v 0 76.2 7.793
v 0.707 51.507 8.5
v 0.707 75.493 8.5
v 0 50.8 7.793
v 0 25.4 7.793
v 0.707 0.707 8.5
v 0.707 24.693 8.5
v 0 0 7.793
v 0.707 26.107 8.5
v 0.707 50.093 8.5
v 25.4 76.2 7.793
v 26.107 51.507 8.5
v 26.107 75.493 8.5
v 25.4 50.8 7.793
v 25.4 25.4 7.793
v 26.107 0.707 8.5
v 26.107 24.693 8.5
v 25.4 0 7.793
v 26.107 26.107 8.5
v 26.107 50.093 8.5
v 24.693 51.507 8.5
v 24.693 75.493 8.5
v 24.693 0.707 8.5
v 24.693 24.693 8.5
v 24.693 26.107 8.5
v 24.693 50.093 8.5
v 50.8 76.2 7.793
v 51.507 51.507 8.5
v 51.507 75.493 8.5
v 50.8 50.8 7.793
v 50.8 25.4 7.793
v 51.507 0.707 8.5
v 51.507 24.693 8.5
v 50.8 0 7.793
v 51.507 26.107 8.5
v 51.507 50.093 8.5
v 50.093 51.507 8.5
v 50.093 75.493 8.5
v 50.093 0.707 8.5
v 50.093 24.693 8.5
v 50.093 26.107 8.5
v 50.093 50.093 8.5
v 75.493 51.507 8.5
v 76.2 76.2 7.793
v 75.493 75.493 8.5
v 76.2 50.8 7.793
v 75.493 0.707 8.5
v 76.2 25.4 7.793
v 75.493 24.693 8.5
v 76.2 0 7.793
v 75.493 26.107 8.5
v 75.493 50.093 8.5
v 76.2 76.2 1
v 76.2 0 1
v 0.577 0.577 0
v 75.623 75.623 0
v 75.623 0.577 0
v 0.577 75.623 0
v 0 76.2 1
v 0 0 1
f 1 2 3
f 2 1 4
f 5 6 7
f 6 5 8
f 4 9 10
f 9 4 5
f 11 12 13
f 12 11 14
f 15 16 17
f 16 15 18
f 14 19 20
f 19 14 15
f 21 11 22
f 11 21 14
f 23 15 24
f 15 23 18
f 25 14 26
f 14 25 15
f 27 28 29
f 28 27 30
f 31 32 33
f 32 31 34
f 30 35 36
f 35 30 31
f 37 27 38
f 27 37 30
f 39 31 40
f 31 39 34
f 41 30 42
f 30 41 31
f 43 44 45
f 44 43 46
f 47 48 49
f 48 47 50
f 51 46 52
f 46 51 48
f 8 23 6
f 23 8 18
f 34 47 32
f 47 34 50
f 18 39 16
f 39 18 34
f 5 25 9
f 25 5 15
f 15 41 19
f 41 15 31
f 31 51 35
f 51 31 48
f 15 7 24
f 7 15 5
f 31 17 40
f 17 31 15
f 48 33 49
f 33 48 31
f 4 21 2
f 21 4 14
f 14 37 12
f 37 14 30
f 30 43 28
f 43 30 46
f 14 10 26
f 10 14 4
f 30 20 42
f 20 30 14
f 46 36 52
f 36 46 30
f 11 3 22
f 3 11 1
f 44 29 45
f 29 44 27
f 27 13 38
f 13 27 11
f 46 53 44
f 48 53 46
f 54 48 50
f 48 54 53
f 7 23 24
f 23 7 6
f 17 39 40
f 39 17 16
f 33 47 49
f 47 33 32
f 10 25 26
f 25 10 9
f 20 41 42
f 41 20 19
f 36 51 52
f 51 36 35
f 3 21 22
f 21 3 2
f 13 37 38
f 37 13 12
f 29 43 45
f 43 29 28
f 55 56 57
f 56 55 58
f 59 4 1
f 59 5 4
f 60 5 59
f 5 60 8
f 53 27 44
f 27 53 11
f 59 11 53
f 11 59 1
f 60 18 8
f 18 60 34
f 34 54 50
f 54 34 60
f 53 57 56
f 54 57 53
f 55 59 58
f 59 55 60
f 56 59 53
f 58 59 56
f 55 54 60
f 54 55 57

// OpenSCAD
thickness=8.5;
tilex=3;
tiley=3;
inch=25.4;
groove=1;

difference()
{
    translate([tilex*inch/2,tiley*inch/2,thickness/2])cube([tilex*inch,tiley*inch,thickness],center=true);
    pocks=floor(tilex*tiley/3);
    for (ii=[1:pocks])
    {
        blemish();
    }
    for (ii=[0:tilex])
    {
        translate([ii*inch,tiley*inch/2,thickness])rotate([0,45,0])cube([groove,tiley*inch*2,groove],center=true);
    }
    for (ii=[0:tiley])
    {
        translate([tilex*inch/2,ii*inch,thickness])rotate([45,0,0])cube([tilex*inch*2,groove,groove],center=true);
    }
    translate([tilex*inch,tiley*inch/2,0])rotate([0,30,0])cube([groove,tiley*inch*2,groove*2],center=true);
    translate([0,tiley*inch/2,0])rotate([0,60,0])cube([groove*2,tiley*inch*2,groove],center=true);
    translate([tilex*inch/2,tiley*inch,0])rotate([60,0,0])cube([tilex*inch*2,groove*2,groove],center=true);
    translate([tilex*inch/2,0,0])rotate([30,0,0])cube([tilex*inch*2,groove,groove*2],center=true);
}

//blemish();
module selectshape(shapenum)
{
    
    if (shapenum==1){ shape01(); }
    if (shapenum==2){ shape02(); }
    if (shapenum==3){ shape03(); }
    if (shapenum==4){ shape04(); }
    if (shapenum==5){ shape05(); }
    if (shapenum==6){ shape06(); }
    if (shapenum==7){ shape07(); }
    if (shapenum==8){ shape08(); }
    if (shapenum==9){ shape09(); }
    if (shapenum==10){ shape10(); }
    if (shapenum==11){ shape11(); }
    if (shapenum==12){ shape12(); }
    if (shapenum==13){ shape13(); }
    if (shapenum==14){ shape14(); }
    if (shapenum==15){ shape15(); }
    if (shapenum==16){ shape16(); }
}
module blemish()
{
    shapenum = floor(rands(0,16,1)[0])+1;
    angle=floor(rands(0,360,1)[0])+1;
    xx=inch*(rands(0,tilex,1)[0]);
    yy=inch*(rands(0,tiley,1)[0]);
    translate([xx,yy,0])rotate([0,0,angle])translate([0,0,thickness])
    {
        translate([0,0,-.5])linear_extrude(height=.101)selectshape(shapenum);
        translate([0,0,-.4])linear_extrude(height=.101)minkowski(){selectshape(shapenum); circle(r=.1);}
        translate([0,0,-.3])linear_extrude(height=.101)minkowski(){selectshape(shapenum); circle(r=.2);}
        translate([0,0,-.2])linear_extrude(height=.101)minkowski(){selectshape(shapenum); circle(r=.3);}
        translate([0,0,-.1])linear_extrude(height=.101)minkowski(){selectshape(shapenum); circle(r=.4);}
    }
}
module shape01()
{
    translate([-3,-2])scale(.8)import("shape001.dxf");
}
module shape02()
{
    translate([-3,-2])scale(.8)import("shape002.dxf");
}
module shape03()
{
    translate([-3,-2,0])scale(.8)import("shape003.dxf");
}
module shape04()
{
    translate([-14,-18,0])scale(.8)import("shape004.dxf");
}
module shape05()
{
    translate([-13,-10,0])scale(.8)import("shape005.dxf");
}
module shape06()
{
    translate([-2,-4,0])scale(.32)import("shape006.dxf");
}
module shape07()
{
    translate([-9,-9,0])scale(.3)import("shape007.dxf");
}
module shape08()
{
    translate([-6,-12,0])scale(.6)import("shape008.dxf");
}
module shape09()
{
    translate([-2,-2,0])scale(.2)import("shape009.dxf");
}
module shape10()
{
    translate([-1,-3,0])scale(.1)import("shape010.dxf");
}
module shape11()
{
    translate([-2,-4,0])scale(.3)import("shape011.dxf");
}
module shape12()
{
    translate([-6,-2,0])scale(.6)import("shape012.dxf");
}
module shape13()
{
    translate([-9,-14,0])scale(.7)import("shape013.dxf");
}
module shape14()
{
    translate([-0.5,-1,0])scale(.1)import("shape014.dxf");
}
module shape15()
{
    translate([-.5,-.5,0])scale(.1)import("shape015.dxf");
}
module shape16()
{
    translate([-6,-6,0])scale(.5)import("shape016.dxf");
}
